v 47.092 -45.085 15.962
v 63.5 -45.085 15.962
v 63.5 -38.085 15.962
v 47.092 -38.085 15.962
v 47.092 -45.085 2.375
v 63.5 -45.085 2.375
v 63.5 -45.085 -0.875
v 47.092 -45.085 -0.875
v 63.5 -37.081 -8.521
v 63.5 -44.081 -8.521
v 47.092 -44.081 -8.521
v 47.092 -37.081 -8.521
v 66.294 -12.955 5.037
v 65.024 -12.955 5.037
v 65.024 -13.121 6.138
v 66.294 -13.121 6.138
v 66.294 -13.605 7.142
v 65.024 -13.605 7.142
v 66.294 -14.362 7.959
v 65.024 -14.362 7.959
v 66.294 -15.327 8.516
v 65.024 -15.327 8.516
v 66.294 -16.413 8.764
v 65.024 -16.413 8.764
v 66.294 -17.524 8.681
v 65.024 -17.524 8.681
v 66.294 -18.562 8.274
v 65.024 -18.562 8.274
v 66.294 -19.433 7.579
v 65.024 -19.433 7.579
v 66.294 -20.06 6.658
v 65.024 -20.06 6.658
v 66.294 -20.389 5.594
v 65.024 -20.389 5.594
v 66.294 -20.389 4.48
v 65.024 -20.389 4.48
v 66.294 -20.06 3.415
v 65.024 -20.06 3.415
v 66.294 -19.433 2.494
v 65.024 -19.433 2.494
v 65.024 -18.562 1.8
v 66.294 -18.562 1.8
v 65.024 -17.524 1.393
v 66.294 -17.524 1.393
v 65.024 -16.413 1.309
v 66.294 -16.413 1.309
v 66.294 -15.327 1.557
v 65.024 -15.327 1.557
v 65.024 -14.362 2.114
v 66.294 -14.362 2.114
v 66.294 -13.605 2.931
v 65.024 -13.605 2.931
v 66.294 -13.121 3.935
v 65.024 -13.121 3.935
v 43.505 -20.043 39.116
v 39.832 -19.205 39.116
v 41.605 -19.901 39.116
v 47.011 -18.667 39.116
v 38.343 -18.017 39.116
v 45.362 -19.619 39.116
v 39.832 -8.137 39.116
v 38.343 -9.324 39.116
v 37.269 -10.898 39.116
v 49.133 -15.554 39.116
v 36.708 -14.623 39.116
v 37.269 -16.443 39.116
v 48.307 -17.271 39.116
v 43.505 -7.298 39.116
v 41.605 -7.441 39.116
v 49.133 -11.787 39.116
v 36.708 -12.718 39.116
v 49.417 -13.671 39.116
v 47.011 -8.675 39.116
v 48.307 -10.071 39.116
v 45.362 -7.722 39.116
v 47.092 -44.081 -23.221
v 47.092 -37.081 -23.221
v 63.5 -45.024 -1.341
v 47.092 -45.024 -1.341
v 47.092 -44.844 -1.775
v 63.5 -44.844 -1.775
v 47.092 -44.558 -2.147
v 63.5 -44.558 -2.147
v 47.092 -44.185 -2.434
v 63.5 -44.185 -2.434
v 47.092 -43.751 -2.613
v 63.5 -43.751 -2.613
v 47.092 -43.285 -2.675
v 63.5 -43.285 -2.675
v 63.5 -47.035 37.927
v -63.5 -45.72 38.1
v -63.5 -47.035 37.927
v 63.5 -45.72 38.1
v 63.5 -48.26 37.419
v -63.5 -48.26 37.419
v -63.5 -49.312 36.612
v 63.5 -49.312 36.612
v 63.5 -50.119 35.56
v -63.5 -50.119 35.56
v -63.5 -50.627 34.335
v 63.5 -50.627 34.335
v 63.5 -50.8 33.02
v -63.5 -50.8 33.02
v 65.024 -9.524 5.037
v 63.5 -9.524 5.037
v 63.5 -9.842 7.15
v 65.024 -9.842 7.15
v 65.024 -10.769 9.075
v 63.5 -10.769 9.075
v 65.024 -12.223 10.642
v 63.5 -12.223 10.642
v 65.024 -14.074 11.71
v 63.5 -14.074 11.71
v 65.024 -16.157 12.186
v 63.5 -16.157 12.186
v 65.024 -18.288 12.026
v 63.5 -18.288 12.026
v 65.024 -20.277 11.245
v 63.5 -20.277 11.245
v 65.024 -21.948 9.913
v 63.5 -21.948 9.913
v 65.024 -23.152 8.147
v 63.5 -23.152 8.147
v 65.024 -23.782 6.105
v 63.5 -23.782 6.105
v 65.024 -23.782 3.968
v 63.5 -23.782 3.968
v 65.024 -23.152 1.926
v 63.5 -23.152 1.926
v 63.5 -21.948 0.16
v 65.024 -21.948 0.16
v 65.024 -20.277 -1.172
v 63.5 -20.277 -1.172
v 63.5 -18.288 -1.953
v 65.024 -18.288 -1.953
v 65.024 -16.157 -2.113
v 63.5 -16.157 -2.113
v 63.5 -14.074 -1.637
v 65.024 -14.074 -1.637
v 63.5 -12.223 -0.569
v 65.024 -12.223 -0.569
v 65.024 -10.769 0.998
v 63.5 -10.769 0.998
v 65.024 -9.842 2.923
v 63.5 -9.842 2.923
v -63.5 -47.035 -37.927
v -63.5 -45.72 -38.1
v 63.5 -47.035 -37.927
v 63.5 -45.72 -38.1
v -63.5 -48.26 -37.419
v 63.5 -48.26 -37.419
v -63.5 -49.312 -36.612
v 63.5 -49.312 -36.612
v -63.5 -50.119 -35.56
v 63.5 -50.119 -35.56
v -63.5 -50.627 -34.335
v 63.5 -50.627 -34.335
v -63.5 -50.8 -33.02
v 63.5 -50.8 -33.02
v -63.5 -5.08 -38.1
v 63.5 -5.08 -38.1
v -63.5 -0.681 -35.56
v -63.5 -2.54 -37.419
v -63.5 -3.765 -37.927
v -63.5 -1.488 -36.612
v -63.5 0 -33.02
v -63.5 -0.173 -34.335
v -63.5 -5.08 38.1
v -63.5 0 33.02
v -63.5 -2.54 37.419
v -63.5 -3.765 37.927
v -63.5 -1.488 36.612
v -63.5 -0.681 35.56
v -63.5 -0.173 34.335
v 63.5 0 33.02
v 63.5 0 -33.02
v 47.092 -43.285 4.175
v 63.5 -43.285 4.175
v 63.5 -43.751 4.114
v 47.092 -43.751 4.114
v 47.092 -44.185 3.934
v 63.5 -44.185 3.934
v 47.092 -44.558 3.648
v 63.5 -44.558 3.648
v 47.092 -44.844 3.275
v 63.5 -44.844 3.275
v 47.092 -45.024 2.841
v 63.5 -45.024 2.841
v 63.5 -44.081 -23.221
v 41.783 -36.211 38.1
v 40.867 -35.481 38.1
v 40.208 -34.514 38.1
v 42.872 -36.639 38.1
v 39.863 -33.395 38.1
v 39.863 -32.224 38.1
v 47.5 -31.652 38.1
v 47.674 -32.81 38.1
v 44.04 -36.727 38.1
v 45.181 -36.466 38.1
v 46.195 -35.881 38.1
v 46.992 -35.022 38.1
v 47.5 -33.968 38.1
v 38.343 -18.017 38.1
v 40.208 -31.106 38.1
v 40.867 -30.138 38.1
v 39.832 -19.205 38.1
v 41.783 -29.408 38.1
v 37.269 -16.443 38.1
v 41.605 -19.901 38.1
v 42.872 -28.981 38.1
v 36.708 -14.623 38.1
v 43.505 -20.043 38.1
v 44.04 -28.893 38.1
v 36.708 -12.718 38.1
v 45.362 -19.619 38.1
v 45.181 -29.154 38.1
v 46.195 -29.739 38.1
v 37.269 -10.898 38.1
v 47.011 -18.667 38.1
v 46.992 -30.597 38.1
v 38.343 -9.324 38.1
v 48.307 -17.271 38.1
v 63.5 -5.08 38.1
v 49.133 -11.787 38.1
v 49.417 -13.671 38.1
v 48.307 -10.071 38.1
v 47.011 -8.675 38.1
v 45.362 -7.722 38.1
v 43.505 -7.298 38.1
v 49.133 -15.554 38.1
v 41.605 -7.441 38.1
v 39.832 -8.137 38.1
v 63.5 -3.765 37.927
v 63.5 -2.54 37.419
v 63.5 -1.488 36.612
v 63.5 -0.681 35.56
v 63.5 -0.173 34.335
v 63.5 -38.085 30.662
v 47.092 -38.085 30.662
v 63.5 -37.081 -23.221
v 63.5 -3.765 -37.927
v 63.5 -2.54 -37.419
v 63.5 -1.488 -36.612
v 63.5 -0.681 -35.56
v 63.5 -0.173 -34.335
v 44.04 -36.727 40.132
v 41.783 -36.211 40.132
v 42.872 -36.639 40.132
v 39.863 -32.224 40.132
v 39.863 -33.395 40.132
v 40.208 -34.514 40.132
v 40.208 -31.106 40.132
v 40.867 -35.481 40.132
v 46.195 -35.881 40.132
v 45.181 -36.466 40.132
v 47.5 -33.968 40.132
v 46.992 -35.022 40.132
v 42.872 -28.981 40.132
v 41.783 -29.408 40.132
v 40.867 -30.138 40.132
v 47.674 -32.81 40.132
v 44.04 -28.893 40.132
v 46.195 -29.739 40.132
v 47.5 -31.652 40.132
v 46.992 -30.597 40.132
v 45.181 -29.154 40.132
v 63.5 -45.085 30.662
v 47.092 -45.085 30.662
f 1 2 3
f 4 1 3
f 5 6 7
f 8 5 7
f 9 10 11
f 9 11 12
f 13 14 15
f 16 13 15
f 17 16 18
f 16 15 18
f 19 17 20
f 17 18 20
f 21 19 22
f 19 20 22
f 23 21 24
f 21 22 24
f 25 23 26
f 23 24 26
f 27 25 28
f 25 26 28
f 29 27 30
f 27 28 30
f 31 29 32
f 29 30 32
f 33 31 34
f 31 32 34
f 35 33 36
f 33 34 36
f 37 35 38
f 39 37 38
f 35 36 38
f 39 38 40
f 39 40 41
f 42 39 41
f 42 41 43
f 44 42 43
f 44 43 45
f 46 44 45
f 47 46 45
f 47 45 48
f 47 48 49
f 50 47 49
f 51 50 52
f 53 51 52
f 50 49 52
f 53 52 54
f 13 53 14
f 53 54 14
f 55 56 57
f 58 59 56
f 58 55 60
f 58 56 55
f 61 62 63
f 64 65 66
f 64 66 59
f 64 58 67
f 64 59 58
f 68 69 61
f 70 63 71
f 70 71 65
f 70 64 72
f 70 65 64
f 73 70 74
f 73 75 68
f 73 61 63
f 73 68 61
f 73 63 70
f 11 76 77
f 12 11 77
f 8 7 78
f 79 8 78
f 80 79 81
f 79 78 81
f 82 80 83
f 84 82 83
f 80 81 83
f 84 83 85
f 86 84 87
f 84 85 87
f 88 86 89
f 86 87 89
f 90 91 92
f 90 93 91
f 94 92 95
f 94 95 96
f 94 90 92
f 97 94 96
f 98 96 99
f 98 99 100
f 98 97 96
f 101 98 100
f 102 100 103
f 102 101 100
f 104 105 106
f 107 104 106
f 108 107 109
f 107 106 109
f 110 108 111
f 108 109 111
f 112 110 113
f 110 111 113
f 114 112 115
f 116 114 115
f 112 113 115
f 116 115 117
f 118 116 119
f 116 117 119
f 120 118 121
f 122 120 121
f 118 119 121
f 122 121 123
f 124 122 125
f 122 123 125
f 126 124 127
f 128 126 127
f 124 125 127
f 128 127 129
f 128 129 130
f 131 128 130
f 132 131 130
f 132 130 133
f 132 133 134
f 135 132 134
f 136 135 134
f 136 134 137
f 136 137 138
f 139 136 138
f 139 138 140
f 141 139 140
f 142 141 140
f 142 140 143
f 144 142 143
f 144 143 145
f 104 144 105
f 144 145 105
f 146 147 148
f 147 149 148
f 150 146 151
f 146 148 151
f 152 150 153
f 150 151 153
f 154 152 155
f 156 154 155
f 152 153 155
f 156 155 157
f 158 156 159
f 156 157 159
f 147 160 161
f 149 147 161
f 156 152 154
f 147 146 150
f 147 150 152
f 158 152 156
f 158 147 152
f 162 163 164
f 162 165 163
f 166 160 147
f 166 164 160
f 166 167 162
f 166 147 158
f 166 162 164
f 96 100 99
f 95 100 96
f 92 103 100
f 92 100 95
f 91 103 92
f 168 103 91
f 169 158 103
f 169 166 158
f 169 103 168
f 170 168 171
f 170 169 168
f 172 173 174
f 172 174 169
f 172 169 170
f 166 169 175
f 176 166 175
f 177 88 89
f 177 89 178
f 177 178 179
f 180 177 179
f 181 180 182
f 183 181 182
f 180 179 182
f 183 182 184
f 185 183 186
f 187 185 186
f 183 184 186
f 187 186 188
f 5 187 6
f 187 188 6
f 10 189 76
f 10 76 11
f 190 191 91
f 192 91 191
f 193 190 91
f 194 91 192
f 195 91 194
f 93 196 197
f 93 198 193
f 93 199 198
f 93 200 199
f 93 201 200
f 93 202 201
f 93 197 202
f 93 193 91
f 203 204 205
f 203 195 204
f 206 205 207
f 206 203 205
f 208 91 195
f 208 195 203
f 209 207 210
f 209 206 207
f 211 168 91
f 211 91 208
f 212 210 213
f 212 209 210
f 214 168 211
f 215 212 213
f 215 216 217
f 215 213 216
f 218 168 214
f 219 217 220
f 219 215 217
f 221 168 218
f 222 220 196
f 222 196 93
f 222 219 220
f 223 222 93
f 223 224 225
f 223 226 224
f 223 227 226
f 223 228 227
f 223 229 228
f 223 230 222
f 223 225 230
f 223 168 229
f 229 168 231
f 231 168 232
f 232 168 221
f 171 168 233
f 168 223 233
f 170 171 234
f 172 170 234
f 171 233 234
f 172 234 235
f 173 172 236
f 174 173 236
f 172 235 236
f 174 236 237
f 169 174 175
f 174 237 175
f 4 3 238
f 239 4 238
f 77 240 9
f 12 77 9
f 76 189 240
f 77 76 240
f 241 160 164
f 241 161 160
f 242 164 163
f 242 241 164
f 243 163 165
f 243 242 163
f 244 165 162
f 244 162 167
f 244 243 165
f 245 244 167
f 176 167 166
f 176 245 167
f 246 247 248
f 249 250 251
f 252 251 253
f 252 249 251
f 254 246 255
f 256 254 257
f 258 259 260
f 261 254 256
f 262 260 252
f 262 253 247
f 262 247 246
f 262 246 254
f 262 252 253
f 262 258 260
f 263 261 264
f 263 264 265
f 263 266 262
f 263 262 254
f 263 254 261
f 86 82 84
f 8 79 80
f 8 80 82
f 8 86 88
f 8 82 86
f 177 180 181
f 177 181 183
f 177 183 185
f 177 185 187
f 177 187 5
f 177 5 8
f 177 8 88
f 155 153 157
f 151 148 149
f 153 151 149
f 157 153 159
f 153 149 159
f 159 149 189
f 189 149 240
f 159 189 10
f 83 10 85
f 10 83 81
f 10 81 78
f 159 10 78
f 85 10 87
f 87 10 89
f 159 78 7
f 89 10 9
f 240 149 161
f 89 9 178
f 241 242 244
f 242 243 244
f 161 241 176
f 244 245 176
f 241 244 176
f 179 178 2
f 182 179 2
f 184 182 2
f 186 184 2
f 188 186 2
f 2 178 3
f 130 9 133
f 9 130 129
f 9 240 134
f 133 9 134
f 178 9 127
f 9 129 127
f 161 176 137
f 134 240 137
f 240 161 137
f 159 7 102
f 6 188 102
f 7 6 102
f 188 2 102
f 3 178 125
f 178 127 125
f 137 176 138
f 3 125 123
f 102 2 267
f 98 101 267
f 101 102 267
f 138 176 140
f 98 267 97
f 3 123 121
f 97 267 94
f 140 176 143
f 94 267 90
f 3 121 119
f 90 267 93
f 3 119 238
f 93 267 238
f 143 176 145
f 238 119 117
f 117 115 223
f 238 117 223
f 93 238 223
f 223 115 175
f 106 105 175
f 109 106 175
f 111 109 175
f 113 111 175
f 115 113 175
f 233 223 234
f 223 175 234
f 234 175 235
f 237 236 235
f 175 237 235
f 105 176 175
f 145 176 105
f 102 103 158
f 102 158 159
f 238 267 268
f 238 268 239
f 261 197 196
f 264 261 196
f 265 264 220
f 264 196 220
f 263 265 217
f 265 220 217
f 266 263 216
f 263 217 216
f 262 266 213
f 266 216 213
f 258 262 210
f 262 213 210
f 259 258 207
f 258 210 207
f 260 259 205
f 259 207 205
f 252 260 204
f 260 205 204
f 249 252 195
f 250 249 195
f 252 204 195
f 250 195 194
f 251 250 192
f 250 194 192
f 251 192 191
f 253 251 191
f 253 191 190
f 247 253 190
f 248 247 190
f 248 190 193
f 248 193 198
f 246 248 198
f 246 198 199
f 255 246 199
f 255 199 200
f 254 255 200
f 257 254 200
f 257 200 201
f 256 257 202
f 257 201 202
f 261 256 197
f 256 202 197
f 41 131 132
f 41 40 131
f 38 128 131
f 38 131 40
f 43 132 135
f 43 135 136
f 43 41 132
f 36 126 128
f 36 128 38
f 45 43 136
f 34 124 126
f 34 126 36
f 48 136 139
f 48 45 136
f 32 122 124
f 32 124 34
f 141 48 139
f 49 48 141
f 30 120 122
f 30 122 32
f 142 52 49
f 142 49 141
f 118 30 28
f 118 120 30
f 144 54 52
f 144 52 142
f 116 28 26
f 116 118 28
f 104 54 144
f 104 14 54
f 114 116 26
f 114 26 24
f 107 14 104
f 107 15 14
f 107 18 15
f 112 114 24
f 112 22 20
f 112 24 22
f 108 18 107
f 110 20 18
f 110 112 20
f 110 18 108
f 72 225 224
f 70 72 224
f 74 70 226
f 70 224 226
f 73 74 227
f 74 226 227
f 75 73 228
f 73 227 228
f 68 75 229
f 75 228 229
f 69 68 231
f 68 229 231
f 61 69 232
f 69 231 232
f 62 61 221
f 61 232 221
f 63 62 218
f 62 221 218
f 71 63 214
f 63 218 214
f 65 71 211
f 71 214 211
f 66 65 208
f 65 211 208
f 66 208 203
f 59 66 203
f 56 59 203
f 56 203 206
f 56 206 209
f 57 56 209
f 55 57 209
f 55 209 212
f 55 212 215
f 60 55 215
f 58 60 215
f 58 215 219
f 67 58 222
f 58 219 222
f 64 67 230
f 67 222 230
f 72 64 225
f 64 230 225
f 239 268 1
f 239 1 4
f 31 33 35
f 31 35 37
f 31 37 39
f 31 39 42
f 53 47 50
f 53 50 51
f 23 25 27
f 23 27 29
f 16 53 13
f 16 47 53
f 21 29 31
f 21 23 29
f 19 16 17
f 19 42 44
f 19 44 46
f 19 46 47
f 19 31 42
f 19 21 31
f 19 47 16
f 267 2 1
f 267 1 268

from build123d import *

# Parameters (mm, degrees)
F0_W      = 127
F0_H      = 76.2
F1_DEPTH  = 50.8
F2_R      = 5.08
F3_W      = 7
F3_H      = 14.7
F4_DEPTH  = 16.4084
F5_W      = 7
F5_H      = 14.7
F6_DEPTH  = 16.4084
F8_DEPTH  = 16.4084
F9_R      = 6.390323
F10_DEPTH = 1.016
F11_R     = 7.169195
F12_DEPTH = 1.524
F13_R     = 3.737659
F14_DEPTH = 1.27
F15_R     = 3.927786
F16_DEPTH = 2.032


with BuildPart() as f1:
    # F0 (on Front) → F1 (new body)
    with BuildSketch(Plane.XZ):
        Rectangle(F0_W, F0_H)
    extrude(amount=F1_DEPTH)

    # F2
    f2_edges = [f1.edges().sort_by_distance(p)[0] for p in [
        (0, -50.8, 38.1),
        (0, -50.8, -38.1),
        (0, 0, 38.1),
        (0, 0, -38.1),
    ]]
    fillet(f2_edges, radius=F2_R)

    # F3 (on face) → F4 (cut)
    with BuildSketch(Plane.YZ.offset(63.5)):
        with Locations((-41.585449, 23.312267)):
            Rectangle(F3_W, F3_H)
    extrude(amount=-F4_DEPTH, mode=Mode.SUBTRACT)

    # F5 (on face) → F6 (cut)
    with BuildSketch(Plane.YZ.offset(63.5)):
        with Locations((-40.580612, -15.871216)):
            Rectangle(F5_W, F5_H)
    extrude(amount=-F6_DEPTH, mode=Mode.SUBTRACT)

    # F7 (on face) → F8 (cut)
    with BuildSketch(Plane.YZ.offset(63.5)):
        with BuildLine():
            ThreePointArc((-43.285449, 4.175303), (-44.558241, 3.648095), (-45.085449, 2.375303))
            Line((-45.085449, 2.375303), (-45.085449, -0.874697))
            ThreePointArc((-45.085449, -0.874697), (-44.558241, -2.14749), (-43.285449, -2.674697))
            Line((-43.285449, -2.674697), (-43.285449, 4.175303))
        make_face()
    extrude(amount=-F8_DEPTH, mode=Mode.SUBTRACT)

    # F9 (on face) → F10 (join)
    with BuildSketch(Plane.XY.offset(38.1)):
        with Locations((43.026961, -13.670774)):
            Circle(F9_R)
    extrude(amount=F10_DEPTH)

    # F11 (on face) → F12 (join)
    with BuildSketch(Plane.YZ.offset(63.5)):
        with Locations((-16.692733, 5.036601)):
            Circle(F11_R)
    extrude(amount=F12_DEPTH)

    # F13 (on face) → F14 (join)
    with BuildSketch(Plane.YZ.offset(65.024)):
        with Locations((-16.692733, 5.036601)):
            Circle(F13_R)
    extrude(amount=F14_DEPTH)

    # F15 (on face) → F16 (join)
    with BuildSketch(Plane.XY.offset(38.1)):
        with Locations((43.746475, -32.809857)):
            Circle(F15_R)
    extrude(amount=F16_DEPTH)


solid = f1.part
